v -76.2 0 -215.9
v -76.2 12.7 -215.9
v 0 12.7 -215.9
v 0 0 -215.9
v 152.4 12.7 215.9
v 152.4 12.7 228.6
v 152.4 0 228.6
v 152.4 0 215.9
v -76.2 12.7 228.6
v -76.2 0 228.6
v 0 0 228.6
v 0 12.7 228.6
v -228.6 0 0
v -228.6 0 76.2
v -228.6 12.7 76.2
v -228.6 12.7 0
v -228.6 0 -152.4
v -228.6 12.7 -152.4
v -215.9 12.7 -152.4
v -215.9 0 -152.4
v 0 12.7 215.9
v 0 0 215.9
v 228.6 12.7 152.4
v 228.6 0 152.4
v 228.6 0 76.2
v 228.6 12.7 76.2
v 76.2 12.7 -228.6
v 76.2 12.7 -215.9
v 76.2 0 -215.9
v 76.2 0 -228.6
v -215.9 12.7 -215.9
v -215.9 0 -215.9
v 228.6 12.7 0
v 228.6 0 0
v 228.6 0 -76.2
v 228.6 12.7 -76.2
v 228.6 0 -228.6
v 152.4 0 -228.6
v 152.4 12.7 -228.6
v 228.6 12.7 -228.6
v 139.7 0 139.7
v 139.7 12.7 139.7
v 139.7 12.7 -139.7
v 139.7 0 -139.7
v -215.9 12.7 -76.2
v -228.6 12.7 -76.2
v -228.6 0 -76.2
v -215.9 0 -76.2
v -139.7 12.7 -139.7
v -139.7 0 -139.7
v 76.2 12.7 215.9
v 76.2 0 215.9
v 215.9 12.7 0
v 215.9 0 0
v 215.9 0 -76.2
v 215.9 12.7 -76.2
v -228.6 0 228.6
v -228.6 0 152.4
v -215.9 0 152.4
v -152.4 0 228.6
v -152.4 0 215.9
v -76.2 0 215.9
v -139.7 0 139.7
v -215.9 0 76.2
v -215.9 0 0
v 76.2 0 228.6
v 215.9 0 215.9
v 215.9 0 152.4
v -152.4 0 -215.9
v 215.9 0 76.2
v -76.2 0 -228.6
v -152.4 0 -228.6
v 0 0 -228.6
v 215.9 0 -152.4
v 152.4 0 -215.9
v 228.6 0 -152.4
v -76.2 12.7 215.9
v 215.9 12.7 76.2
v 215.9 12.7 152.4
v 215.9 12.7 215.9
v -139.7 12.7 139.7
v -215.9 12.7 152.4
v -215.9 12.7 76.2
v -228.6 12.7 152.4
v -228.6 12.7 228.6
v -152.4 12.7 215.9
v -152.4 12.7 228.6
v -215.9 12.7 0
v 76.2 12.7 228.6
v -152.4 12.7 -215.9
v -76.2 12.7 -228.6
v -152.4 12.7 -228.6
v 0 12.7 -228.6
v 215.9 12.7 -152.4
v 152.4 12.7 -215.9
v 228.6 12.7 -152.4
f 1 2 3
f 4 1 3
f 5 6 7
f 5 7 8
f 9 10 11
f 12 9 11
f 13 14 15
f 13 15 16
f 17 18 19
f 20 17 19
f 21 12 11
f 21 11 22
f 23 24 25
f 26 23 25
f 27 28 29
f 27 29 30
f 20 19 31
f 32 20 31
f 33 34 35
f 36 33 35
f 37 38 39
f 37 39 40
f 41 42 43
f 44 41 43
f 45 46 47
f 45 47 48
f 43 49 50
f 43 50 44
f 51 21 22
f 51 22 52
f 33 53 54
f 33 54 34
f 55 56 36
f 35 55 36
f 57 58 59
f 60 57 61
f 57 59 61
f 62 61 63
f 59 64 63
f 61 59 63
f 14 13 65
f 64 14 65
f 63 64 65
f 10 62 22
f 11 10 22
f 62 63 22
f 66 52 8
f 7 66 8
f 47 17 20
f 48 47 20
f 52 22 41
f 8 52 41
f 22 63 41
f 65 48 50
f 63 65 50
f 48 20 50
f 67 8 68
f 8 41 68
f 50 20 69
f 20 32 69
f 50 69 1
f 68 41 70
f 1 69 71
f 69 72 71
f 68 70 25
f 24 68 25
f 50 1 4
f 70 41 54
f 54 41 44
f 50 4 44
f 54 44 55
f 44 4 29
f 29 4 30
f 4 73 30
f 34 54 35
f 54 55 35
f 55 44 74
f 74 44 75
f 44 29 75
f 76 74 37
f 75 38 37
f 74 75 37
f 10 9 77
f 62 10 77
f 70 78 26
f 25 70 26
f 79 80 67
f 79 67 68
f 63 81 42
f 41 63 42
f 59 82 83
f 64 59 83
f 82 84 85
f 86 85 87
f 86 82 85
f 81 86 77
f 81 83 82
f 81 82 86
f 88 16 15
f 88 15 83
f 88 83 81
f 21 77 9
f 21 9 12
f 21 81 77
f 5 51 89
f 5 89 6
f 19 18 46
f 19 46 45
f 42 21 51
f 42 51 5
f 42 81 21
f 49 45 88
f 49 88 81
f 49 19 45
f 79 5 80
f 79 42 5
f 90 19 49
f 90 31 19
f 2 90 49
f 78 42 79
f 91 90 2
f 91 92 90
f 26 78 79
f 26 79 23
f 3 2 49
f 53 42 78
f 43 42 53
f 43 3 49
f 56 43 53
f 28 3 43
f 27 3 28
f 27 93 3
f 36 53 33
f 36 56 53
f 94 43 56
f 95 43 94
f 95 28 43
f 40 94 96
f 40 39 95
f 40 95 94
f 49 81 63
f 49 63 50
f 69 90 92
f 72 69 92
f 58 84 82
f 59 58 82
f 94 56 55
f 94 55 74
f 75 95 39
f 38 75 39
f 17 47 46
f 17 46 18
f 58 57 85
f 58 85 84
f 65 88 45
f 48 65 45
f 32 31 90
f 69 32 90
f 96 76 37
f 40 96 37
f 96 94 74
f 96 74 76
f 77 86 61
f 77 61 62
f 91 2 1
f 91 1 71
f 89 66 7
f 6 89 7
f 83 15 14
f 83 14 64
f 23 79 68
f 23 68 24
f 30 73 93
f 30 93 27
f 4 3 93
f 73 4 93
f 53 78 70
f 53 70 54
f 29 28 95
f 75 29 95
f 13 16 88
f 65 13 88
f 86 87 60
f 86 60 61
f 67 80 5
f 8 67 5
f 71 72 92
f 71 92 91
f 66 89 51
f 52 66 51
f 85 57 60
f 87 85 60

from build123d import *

# Parameters (mm, degrees)
SKETCH1_W           = 457.2
SKETCH1_H           = 457.2
BOSS_EXTRUDE1_DEPTH = 12.7
SKETCH2_W           = 279.4
SKETCH2_H           = 279.4
CUT_EXTRUDE1_DEPTH  = 324.538575753
SKETCH3_W           = 12.7
SKETCH3_H           = 12.7
SKETCH3_W_2         = 63.5
SKETCH3_H_2         = 63.5
SKETCH3_W_3         = 76.2
SKETCH3_H_3         = 76.2
CUT_EXTRUDE2_DEPTH  = 324.538575753


with BuildPart() as part:
    # Sketch1 → Boss-Extrude1 (new body)
    with BuildSketch(Plane(origin=(0, 0, 0), x_dir=(1, 0, 0), z_dir=(0, 1, 0))):
        Rectangle(SKETCH1_W, SKETCH1_H)
    extrude(amount=BOSS_EXTRUDE1_DEPTH)

    # Sketch2 → Cut-Extrude1 (cut, through all)
    with BuildSketch(Plane(origin=(0, 12.7, 0), x_dir=(1, 0, 0), z_dir=(0, 1, 0))):
        Rectangle(SKETCH2_W, SKETCH2_H)
    extrude(amount=-CUT_EXTRUDE1_DEPTH, mode=Mode.SUBTRACT)

    # Sketch3 → Cut-Extrude2 (cut, through all)
    with BuildSketch(Plane(origin=(0, 12.7, 0), x_dir=(1, 0, 0), z_dir=(0, 1, 0))):
        with Locations((-222.25, 222.25)):
            Rectangle(SKETCH3_W, SKETCH3_H)
        with Locations((-184.15, 222.25)):
            Rectangle(SKETCH3_W_2, SKETCH3_H)
        with Locations((-222.25, 184.15)):
            Rectangle(SKETCH3_W, SKETCH3_H_2)
        with Locations((-38.1, 222.25)):
            Rectangle(SKETCH3_W_3, SKETCH3_H)
        with Locations((114.3, 222.25)):
            Rectangle(SKETCH3_W_3, SKETCH3_H)
        with Locations((222.25, -222.25)):
            Rectangle(SKETCH3_W, SKETCH3_H)
        with Locations((184.15, -222.25)):
            Rectangle(SKETCH3_W_2, SKETCH3_H)
        with Locations((222.25, -184.15)):
            Rectangle(SKETCH3_W, SKETCH3_H_2)
        with Locations((222.25, -38.1)):
            Rectangle(SKETCH3_W, SKETCH3_H_3)
        with Locations((222.25, 114.3)):
            Rectangle(SKETCH3_W, SKETCH3_H_3)
        with Locations((38.1, -222.25)):
            Rectangle(SKETCH3_W_3, SKETCH3_H)
        with Locations((-114.3, -222.25)):
            Rectangle(SKETCH3_W_3, SKETCH3_H)
        with Locations((-222.25, 38.1)):
            Rectangle(SKETCH3_W, SKETCH3_H_3)
        with Locations((-222.25, -114.3)):
            Rectangle(SKETCH3_W, SKETCH3_H_3)
    extrude(amount=-CUT_EXTRUDE2_DEPTH, mode=Mode.SUBTRACT)


solid = part.part
